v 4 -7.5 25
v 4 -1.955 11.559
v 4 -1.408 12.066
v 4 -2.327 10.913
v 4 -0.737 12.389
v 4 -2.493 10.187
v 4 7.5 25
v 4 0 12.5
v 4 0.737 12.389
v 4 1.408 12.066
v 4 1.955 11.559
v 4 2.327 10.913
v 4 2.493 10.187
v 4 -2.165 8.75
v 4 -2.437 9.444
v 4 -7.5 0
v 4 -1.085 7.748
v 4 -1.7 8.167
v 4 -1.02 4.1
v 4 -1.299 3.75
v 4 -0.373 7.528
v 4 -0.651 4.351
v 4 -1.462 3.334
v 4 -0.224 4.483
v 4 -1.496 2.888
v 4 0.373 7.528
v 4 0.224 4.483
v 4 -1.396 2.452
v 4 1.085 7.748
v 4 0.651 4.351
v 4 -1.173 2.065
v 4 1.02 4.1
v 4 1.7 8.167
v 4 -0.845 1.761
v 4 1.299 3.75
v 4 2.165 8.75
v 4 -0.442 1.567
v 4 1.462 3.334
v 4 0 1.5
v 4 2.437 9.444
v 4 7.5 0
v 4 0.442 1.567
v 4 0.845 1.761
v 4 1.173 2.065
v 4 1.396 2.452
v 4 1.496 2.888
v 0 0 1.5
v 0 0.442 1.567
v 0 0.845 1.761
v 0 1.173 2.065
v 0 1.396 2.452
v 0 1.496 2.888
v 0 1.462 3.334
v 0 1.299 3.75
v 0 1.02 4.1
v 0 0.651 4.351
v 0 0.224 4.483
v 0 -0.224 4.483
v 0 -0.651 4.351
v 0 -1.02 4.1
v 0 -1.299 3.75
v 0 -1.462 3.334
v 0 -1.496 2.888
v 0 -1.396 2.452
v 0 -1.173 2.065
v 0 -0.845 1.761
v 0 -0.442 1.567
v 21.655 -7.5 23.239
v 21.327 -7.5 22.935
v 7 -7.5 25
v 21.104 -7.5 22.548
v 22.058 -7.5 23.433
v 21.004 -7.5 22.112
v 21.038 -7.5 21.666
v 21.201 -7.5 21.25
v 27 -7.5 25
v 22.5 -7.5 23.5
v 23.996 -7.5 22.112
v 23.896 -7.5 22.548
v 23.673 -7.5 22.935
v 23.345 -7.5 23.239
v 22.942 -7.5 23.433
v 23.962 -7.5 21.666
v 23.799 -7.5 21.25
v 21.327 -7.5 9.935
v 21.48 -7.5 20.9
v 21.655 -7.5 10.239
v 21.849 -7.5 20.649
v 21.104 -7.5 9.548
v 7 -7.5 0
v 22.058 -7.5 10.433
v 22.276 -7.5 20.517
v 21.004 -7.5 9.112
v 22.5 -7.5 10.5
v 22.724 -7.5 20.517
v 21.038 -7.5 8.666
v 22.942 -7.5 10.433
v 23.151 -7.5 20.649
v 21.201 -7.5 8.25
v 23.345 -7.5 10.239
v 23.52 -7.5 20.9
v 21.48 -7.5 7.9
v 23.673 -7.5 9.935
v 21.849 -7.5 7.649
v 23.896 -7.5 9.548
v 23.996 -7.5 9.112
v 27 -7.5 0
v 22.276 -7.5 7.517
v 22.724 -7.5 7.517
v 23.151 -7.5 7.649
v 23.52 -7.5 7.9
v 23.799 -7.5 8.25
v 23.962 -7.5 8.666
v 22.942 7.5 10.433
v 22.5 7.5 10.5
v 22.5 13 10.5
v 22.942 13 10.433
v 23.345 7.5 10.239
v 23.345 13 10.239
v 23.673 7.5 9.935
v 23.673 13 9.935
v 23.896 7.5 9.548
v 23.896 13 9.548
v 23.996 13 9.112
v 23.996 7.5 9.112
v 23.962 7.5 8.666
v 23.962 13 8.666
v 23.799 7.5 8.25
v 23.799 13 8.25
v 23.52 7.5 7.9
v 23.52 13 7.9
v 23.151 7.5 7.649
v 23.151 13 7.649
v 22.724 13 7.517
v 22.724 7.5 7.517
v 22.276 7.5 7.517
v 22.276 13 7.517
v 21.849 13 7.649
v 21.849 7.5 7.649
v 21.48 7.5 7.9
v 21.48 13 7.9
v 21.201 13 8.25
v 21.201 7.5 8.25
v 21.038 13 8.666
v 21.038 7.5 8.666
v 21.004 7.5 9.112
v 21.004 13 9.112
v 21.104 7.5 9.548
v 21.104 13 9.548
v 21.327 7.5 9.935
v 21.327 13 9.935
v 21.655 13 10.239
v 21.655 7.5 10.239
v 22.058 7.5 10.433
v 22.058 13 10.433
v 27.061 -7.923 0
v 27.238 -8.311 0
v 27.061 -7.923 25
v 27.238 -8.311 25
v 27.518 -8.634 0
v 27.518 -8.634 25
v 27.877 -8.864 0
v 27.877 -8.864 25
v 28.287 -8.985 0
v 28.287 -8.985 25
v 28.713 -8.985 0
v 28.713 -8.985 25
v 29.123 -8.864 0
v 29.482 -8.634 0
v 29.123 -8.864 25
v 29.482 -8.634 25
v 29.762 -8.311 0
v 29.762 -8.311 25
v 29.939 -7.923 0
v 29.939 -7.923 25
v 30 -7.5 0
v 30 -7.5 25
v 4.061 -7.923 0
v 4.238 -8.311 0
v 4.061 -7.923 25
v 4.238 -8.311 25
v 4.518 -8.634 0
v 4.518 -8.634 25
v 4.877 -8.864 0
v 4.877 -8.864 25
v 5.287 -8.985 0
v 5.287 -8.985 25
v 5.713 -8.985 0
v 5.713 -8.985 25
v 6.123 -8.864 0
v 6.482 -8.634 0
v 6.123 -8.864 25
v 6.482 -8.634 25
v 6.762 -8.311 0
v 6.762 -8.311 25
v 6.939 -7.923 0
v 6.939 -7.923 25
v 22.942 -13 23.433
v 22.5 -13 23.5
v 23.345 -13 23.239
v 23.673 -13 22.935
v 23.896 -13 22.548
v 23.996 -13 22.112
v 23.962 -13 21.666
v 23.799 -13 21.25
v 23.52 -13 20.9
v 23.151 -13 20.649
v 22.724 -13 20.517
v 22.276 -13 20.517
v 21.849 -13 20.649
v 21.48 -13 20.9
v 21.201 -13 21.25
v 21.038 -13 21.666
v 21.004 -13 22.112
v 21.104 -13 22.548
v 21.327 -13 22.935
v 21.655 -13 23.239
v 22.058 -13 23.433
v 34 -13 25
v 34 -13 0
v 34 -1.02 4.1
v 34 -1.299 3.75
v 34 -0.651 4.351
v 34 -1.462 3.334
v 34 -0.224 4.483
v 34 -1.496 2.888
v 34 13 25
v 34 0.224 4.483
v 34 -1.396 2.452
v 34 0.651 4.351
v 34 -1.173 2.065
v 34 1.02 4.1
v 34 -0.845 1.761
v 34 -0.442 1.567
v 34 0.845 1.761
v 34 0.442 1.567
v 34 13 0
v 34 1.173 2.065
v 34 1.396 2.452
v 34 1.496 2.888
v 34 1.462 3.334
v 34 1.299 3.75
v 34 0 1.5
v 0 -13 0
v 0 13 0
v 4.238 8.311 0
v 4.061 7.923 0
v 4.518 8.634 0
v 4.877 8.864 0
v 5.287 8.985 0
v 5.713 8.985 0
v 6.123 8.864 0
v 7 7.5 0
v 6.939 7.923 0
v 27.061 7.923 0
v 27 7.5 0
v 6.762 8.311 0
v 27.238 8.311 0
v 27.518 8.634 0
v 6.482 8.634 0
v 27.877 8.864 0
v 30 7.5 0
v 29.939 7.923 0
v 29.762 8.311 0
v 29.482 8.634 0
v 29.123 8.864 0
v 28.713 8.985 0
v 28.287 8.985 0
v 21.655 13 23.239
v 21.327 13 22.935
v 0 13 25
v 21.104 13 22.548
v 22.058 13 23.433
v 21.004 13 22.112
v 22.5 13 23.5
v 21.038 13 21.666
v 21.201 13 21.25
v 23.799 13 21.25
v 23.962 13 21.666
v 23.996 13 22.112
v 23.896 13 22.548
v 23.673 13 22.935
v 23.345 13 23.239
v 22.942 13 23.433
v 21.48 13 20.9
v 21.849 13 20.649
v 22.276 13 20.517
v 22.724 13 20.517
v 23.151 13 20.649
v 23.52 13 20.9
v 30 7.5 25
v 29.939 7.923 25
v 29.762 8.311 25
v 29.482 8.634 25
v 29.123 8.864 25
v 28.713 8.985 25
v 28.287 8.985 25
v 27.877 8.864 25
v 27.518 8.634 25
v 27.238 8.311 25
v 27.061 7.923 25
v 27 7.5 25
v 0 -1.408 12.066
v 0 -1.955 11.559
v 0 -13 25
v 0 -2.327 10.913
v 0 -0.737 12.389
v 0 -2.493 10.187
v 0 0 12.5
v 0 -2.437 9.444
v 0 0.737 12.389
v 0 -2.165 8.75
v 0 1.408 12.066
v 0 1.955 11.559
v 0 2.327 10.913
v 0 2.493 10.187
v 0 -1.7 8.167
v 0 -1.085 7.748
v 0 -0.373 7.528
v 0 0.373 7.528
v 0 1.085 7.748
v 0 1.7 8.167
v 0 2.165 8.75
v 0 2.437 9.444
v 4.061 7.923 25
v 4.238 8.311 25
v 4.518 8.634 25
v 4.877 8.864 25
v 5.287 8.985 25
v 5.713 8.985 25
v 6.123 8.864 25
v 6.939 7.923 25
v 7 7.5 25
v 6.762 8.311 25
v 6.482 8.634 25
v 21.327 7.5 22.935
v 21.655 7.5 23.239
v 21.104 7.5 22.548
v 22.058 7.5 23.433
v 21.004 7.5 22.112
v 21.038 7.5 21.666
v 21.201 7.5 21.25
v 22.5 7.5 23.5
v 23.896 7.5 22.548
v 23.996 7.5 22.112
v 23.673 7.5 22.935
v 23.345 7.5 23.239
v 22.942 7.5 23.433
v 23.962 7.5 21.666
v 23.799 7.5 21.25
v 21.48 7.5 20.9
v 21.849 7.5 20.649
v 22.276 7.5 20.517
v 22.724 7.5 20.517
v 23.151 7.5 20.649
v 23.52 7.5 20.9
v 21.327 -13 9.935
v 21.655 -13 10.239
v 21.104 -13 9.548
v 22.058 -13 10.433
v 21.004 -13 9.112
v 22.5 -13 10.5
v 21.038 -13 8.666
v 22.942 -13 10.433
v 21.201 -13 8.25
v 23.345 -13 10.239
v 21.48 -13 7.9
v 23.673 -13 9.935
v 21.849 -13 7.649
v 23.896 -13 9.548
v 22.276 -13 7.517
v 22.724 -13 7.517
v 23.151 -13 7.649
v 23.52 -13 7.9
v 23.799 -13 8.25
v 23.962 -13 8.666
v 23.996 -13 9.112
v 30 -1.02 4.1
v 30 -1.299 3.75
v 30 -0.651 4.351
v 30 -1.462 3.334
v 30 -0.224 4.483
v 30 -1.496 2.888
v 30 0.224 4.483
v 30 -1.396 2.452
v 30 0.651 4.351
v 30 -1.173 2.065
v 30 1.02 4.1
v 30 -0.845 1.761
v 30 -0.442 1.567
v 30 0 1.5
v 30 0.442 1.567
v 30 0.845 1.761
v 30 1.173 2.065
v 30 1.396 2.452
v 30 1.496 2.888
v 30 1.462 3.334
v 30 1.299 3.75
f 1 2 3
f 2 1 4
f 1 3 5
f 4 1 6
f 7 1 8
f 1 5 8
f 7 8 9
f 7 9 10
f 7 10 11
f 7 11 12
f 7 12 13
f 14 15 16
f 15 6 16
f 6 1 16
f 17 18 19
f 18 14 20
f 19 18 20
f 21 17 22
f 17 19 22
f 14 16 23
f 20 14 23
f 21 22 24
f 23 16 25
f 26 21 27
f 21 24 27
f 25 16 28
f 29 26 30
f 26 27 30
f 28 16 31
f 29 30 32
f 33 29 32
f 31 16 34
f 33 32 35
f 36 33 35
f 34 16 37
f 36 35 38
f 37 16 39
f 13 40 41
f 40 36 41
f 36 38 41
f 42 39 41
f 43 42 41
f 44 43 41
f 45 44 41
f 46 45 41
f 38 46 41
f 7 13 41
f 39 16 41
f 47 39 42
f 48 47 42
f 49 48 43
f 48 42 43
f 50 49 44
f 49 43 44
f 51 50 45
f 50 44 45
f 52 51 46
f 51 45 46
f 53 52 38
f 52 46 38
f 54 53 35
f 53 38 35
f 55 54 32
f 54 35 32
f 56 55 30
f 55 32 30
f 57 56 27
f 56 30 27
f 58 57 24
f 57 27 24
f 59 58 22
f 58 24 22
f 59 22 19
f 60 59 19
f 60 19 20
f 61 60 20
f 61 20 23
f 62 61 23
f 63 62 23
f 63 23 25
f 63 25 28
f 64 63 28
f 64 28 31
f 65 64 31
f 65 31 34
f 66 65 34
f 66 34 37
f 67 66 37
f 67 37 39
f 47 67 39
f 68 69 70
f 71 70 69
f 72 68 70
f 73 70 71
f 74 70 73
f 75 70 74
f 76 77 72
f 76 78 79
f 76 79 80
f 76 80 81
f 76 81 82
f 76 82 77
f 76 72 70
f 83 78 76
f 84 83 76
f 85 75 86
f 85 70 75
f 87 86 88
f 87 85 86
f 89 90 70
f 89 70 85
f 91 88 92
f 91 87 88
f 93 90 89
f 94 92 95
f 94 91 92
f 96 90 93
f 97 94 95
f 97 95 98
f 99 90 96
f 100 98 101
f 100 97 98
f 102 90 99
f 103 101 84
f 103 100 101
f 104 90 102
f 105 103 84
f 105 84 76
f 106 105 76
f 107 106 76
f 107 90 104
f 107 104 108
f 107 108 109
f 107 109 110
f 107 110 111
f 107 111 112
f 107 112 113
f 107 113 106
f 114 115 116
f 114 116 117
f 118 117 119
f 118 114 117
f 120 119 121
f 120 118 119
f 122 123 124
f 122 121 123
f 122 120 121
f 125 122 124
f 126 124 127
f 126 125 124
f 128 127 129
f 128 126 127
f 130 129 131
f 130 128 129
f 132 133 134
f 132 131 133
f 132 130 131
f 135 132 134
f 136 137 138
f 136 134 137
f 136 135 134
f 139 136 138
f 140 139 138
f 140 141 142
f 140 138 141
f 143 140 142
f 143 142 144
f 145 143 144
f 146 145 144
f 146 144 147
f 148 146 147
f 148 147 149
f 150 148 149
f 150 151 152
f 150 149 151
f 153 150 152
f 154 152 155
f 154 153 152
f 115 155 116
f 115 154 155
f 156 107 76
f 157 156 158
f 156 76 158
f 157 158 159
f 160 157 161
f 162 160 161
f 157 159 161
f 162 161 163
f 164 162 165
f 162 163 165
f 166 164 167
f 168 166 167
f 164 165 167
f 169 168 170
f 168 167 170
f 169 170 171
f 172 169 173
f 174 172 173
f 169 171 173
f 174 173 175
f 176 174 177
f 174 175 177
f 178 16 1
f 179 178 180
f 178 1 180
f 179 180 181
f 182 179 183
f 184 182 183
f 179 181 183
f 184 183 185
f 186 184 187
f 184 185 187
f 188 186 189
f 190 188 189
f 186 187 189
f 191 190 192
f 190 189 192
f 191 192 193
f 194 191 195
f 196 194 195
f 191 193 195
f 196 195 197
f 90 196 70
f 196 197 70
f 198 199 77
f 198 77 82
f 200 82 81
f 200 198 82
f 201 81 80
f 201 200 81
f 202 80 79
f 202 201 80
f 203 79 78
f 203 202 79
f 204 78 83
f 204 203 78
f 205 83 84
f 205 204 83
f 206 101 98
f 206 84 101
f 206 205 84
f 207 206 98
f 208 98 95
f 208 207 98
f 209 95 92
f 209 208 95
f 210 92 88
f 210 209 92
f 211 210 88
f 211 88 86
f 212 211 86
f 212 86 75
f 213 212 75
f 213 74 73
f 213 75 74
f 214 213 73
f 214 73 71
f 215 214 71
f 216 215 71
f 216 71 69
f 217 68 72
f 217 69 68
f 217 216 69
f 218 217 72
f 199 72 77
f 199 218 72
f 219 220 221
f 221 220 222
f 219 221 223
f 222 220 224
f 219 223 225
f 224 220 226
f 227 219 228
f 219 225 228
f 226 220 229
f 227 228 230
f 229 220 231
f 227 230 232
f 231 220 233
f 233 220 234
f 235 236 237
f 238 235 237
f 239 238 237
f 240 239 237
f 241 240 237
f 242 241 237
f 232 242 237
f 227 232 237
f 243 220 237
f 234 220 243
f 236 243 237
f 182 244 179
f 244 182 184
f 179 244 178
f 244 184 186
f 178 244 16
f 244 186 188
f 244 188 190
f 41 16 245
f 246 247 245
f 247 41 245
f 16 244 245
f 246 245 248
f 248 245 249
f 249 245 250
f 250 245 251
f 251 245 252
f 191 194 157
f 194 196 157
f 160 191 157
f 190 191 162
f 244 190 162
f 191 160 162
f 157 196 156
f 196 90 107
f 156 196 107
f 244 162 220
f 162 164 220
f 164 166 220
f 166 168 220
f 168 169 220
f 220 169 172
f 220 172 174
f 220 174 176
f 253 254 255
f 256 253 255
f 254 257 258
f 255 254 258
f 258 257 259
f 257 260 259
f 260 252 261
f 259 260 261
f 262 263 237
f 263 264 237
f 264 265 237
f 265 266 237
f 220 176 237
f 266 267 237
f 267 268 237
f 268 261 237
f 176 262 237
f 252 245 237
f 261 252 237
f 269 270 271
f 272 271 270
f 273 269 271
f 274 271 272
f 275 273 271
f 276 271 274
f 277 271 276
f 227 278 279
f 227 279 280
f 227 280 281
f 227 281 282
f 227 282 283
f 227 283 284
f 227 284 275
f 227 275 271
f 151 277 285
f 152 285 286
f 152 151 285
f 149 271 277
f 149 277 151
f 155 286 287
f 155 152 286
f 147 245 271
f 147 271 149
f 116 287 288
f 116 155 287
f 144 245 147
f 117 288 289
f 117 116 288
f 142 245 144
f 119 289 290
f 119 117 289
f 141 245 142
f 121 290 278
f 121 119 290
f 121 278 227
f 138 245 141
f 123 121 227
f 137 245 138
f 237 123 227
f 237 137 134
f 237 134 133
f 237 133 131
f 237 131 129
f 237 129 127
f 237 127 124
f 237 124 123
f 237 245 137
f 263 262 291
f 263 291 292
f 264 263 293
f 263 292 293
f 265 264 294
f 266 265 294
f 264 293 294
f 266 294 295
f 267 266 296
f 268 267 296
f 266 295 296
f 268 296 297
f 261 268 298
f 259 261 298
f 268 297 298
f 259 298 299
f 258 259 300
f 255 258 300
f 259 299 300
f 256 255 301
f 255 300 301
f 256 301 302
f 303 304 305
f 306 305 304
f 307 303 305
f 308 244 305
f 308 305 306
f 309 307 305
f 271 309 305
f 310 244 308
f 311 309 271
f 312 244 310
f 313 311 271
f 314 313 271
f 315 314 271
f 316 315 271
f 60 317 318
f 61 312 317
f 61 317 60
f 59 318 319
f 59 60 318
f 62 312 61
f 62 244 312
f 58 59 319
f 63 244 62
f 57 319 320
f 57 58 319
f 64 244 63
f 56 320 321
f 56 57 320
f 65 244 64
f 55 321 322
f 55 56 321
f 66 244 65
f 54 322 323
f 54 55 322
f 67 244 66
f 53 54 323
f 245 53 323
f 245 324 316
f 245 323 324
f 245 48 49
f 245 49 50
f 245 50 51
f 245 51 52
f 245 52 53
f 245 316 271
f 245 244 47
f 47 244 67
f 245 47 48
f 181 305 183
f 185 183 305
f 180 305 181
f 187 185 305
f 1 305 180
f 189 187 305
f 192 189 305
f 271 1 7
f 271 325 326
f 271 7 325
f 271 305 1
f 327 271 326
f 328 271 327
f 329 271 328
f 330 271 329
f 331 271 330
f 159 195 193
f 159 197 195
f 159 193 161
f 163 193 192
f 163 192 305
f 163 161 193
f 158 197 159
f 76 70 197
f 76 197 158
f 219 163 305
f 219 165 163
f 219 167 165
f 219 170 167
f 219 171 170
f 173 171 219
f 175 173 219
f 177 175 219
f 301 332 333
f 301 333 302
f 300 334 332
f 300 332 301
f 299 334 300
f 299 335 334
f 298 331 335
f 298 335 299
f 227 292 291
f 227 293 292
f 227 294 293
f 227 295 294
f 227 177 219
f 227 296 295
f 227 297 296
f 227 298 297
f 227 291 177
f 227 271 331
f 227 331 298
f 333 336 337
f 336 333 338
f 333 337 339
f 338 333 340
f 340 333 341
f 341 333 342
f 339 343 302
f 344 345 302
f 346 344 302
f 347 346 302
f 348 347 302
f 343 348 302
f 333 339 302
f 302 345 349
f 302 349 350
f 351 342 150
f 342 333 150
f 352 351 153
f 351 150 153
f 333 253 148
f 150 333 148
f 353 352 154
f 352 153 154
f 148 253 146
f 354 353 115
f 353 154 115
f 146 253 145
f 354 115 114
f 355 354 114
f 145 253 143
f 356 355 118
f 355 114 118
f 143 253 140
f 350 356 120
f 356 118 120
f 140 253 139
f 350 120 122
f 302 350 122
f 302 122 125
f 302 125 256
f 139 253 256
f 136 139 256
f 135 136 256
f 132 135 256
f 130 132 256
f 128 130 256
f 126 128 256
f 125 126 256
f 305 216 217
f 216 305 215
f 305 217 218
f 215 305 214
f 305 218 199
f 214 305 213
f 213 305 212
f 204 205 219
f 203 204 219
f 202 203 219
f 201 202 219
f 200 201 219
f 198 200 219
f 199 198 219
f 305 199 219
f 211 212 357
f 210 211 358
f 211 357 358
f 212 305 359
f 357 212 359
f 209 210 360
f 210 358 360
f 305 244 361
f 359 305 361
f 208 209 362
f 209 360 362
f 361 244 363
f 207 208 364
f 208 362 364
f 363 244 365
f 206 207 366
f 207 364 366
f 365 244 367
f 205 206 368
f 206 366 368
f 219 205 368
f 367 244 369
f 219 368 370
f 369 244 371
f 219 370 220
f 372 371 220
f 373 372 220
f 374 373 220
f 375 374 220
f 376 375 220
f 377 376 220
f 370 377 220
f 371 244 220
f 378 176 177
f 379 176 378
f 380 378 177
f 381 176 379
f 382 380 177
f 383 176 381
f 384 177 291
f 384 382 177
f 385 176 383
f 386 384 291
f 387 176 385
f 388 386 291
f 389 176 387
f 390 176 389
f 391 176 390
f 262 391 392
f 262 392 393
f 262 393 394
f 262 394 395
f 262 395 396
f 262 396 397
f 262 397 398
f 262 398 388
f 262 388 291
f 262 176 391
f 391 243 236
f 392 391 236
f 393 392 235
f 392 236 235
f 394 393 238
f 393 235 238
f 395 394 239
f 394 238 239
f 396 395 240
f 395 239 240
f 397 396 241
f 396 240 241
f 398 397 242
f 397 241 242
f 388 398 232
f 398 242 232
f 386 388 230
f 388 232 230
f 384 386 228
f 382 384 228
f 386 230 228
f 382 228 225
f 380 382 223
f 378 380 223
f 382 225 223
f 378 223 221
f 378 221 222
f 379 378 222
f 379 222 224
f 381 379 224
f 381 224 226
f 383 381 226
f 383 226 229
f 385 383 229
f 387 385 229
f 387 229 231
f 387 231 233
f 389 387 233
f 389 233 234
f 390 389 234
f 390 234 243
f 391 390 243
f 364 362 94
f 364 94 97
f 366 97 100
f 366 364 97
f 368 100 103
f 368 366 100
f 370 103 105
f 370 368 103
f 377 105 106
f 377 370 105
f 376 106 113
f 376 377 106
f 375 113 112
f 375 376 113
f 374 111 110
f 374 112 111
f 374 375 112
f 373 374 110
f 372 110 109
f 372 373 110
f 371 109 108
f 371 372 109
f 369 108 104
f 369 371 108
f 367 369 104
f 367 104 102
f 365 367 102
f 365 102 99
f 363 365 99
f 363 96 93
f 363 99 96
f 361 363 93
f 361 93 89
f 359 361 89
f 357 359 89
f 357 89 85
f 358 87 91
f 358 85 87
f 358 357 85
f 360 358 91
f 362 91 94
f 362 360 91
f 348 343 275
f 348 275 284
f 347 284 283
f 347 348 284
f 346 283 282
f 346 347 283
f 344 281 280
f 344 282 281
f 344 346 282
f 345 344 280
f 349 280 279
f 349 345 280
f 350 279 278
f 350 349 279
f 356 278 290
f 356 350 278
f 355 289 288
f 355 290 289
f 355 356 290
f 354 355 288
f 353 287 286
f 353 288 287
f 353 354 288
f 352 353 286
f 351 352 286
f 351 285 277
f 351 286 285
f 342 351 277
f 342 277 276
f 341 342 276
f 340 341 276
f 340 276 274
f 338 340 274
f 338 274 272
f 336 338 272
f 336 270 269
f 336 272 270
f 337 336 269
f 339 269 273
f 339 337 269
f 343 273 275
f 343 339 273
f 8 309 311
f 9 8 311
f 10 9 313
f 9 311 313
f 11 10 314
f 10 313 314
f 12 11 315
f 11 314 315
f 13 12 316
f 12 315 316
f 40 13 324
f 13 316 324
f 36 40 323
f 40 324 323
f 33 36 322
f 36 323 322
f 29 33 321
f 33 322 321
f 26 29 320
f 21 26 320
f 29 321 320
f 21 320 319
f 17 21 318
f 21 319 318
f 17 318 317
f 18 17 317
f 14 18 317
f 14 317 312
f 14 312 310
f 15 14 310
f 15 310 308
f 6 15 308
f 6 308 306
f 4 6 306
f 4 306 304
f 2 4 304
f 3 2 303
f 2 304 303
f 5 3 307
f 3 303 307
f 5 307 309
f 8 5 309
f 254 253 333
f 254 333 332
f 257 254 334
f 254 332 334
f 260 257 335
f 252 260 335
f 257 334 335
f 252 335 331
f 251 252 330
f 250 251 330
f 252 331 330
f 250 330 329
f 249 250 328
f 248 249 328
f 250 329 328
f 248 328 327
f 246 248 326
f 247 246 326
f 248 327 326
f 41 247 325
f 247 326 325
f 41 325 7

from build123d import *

# Parameters (mm, degrees)
SKETCH_1_W               = 34
SKETCH_1_H               = 26
SKETCH_1_W_2             = 26
SKETCH_1_H_2             = 15
EXTRUDE_1_DEPTH          = 25
SKETCH_2_R               = 1.5
CUT_EXTRUDE_1_DEPTH      = 45.158804332
SKETCH_3_R               = 2.5
CUT_EXTRUDE_2_DEPTH      = 4
CUT_EXTRUDE_4_DEPTH      = 47.917480751
CUT_EXTRUDE_4_DEPTH_BACK = 47.917480751
SKETCH_5_R               = 1.5
SKETCH_6_R               = 1.5
CUT_EXTRUDE_5_DEPTH      = 45.158804332


with BuildPart() as part:
    # 草图1 → 凸台-拉伸1 (new body)
    with BuildSketch(Plane.XY):
        with Locations((17, 0)):
            Rectangle(SKETCH_1_W, SKETCH_1_H)
        with Locations((17, 0)):
            Rectangle(SKETCH_1_W_2, SKETCH_1_H_2, mode=Mode.SUBTRACT)
    extrude(amount=EXTRUDE_1_DEPTH)

    # 草图2 → 切除-拉伸1 (cut, through all)
    with BuildSketch(Plane.XY.offset(25)):
        with Locations((5.5, 7.5)):
            Circle(SKETCH_2_R)
        with Locations((5.5, -7.5)):
            Circle(SKETCH_2_R)
        with Locations((28.5, -7.5)):
            Circle(SKETCH_2_R)
        with Locations((28.5, 7.5)):
            Circle(SKETCH_2_R)
    extrude(amount=-CUT_EXTRUDE_1_DEPTH, mode=Mode.SUBTRACT)

    # 草图3 → 切除-拉伸2 (cut)
    with BuildSketch(Plane.ZY):
        with Locations((10, 0)):
            Circle(SKETCH_3_R)
    extrude(amount=-CUT_EXTRUDE_2_DEPTH, mode=Mode.SUBTRACT)

    # 草图5 → 切除-拉伸4 (cut, two sides: drawn at the far end of the back side and taken through both)
    with BuildSketch(Plane(origin=(0, -7.5, 0), x_dir=(1, 0, 0), z_dir=(0, 1, 0)).offset(-CUT_EXTRUDE_4_DEPTH_BACK)):
        with Locations(Location((22.5, -22, 0), (0, 0, 270))):
            Circle(SKETCH_5_R)
        with Locations(Location((22.5, -9, 0), (0, 0, 270))):
            Circle(SKETCH_5_R)
    extrude(amount=CUT_EXTRUDE_4_DEPTH + CUT_EXTRUDE_4_DEPTH_BACK, mode=Mode.SUBTRACT)

    # 草图6 → 切除-拉伸5 (cut, through all)
    with BuildSketch(Plane(origin=(34, 0, 0), x_dir=(0, 0, -1), z_dir=(1, 0, 0))):
        with Locations((-3, 0)):
            Circle(SKETCH_6_R)
    extrude(amount=-CUT_EXTRUDE_5_DEPTH, mode=Mode.SUBTRACT)


solid = part.part
